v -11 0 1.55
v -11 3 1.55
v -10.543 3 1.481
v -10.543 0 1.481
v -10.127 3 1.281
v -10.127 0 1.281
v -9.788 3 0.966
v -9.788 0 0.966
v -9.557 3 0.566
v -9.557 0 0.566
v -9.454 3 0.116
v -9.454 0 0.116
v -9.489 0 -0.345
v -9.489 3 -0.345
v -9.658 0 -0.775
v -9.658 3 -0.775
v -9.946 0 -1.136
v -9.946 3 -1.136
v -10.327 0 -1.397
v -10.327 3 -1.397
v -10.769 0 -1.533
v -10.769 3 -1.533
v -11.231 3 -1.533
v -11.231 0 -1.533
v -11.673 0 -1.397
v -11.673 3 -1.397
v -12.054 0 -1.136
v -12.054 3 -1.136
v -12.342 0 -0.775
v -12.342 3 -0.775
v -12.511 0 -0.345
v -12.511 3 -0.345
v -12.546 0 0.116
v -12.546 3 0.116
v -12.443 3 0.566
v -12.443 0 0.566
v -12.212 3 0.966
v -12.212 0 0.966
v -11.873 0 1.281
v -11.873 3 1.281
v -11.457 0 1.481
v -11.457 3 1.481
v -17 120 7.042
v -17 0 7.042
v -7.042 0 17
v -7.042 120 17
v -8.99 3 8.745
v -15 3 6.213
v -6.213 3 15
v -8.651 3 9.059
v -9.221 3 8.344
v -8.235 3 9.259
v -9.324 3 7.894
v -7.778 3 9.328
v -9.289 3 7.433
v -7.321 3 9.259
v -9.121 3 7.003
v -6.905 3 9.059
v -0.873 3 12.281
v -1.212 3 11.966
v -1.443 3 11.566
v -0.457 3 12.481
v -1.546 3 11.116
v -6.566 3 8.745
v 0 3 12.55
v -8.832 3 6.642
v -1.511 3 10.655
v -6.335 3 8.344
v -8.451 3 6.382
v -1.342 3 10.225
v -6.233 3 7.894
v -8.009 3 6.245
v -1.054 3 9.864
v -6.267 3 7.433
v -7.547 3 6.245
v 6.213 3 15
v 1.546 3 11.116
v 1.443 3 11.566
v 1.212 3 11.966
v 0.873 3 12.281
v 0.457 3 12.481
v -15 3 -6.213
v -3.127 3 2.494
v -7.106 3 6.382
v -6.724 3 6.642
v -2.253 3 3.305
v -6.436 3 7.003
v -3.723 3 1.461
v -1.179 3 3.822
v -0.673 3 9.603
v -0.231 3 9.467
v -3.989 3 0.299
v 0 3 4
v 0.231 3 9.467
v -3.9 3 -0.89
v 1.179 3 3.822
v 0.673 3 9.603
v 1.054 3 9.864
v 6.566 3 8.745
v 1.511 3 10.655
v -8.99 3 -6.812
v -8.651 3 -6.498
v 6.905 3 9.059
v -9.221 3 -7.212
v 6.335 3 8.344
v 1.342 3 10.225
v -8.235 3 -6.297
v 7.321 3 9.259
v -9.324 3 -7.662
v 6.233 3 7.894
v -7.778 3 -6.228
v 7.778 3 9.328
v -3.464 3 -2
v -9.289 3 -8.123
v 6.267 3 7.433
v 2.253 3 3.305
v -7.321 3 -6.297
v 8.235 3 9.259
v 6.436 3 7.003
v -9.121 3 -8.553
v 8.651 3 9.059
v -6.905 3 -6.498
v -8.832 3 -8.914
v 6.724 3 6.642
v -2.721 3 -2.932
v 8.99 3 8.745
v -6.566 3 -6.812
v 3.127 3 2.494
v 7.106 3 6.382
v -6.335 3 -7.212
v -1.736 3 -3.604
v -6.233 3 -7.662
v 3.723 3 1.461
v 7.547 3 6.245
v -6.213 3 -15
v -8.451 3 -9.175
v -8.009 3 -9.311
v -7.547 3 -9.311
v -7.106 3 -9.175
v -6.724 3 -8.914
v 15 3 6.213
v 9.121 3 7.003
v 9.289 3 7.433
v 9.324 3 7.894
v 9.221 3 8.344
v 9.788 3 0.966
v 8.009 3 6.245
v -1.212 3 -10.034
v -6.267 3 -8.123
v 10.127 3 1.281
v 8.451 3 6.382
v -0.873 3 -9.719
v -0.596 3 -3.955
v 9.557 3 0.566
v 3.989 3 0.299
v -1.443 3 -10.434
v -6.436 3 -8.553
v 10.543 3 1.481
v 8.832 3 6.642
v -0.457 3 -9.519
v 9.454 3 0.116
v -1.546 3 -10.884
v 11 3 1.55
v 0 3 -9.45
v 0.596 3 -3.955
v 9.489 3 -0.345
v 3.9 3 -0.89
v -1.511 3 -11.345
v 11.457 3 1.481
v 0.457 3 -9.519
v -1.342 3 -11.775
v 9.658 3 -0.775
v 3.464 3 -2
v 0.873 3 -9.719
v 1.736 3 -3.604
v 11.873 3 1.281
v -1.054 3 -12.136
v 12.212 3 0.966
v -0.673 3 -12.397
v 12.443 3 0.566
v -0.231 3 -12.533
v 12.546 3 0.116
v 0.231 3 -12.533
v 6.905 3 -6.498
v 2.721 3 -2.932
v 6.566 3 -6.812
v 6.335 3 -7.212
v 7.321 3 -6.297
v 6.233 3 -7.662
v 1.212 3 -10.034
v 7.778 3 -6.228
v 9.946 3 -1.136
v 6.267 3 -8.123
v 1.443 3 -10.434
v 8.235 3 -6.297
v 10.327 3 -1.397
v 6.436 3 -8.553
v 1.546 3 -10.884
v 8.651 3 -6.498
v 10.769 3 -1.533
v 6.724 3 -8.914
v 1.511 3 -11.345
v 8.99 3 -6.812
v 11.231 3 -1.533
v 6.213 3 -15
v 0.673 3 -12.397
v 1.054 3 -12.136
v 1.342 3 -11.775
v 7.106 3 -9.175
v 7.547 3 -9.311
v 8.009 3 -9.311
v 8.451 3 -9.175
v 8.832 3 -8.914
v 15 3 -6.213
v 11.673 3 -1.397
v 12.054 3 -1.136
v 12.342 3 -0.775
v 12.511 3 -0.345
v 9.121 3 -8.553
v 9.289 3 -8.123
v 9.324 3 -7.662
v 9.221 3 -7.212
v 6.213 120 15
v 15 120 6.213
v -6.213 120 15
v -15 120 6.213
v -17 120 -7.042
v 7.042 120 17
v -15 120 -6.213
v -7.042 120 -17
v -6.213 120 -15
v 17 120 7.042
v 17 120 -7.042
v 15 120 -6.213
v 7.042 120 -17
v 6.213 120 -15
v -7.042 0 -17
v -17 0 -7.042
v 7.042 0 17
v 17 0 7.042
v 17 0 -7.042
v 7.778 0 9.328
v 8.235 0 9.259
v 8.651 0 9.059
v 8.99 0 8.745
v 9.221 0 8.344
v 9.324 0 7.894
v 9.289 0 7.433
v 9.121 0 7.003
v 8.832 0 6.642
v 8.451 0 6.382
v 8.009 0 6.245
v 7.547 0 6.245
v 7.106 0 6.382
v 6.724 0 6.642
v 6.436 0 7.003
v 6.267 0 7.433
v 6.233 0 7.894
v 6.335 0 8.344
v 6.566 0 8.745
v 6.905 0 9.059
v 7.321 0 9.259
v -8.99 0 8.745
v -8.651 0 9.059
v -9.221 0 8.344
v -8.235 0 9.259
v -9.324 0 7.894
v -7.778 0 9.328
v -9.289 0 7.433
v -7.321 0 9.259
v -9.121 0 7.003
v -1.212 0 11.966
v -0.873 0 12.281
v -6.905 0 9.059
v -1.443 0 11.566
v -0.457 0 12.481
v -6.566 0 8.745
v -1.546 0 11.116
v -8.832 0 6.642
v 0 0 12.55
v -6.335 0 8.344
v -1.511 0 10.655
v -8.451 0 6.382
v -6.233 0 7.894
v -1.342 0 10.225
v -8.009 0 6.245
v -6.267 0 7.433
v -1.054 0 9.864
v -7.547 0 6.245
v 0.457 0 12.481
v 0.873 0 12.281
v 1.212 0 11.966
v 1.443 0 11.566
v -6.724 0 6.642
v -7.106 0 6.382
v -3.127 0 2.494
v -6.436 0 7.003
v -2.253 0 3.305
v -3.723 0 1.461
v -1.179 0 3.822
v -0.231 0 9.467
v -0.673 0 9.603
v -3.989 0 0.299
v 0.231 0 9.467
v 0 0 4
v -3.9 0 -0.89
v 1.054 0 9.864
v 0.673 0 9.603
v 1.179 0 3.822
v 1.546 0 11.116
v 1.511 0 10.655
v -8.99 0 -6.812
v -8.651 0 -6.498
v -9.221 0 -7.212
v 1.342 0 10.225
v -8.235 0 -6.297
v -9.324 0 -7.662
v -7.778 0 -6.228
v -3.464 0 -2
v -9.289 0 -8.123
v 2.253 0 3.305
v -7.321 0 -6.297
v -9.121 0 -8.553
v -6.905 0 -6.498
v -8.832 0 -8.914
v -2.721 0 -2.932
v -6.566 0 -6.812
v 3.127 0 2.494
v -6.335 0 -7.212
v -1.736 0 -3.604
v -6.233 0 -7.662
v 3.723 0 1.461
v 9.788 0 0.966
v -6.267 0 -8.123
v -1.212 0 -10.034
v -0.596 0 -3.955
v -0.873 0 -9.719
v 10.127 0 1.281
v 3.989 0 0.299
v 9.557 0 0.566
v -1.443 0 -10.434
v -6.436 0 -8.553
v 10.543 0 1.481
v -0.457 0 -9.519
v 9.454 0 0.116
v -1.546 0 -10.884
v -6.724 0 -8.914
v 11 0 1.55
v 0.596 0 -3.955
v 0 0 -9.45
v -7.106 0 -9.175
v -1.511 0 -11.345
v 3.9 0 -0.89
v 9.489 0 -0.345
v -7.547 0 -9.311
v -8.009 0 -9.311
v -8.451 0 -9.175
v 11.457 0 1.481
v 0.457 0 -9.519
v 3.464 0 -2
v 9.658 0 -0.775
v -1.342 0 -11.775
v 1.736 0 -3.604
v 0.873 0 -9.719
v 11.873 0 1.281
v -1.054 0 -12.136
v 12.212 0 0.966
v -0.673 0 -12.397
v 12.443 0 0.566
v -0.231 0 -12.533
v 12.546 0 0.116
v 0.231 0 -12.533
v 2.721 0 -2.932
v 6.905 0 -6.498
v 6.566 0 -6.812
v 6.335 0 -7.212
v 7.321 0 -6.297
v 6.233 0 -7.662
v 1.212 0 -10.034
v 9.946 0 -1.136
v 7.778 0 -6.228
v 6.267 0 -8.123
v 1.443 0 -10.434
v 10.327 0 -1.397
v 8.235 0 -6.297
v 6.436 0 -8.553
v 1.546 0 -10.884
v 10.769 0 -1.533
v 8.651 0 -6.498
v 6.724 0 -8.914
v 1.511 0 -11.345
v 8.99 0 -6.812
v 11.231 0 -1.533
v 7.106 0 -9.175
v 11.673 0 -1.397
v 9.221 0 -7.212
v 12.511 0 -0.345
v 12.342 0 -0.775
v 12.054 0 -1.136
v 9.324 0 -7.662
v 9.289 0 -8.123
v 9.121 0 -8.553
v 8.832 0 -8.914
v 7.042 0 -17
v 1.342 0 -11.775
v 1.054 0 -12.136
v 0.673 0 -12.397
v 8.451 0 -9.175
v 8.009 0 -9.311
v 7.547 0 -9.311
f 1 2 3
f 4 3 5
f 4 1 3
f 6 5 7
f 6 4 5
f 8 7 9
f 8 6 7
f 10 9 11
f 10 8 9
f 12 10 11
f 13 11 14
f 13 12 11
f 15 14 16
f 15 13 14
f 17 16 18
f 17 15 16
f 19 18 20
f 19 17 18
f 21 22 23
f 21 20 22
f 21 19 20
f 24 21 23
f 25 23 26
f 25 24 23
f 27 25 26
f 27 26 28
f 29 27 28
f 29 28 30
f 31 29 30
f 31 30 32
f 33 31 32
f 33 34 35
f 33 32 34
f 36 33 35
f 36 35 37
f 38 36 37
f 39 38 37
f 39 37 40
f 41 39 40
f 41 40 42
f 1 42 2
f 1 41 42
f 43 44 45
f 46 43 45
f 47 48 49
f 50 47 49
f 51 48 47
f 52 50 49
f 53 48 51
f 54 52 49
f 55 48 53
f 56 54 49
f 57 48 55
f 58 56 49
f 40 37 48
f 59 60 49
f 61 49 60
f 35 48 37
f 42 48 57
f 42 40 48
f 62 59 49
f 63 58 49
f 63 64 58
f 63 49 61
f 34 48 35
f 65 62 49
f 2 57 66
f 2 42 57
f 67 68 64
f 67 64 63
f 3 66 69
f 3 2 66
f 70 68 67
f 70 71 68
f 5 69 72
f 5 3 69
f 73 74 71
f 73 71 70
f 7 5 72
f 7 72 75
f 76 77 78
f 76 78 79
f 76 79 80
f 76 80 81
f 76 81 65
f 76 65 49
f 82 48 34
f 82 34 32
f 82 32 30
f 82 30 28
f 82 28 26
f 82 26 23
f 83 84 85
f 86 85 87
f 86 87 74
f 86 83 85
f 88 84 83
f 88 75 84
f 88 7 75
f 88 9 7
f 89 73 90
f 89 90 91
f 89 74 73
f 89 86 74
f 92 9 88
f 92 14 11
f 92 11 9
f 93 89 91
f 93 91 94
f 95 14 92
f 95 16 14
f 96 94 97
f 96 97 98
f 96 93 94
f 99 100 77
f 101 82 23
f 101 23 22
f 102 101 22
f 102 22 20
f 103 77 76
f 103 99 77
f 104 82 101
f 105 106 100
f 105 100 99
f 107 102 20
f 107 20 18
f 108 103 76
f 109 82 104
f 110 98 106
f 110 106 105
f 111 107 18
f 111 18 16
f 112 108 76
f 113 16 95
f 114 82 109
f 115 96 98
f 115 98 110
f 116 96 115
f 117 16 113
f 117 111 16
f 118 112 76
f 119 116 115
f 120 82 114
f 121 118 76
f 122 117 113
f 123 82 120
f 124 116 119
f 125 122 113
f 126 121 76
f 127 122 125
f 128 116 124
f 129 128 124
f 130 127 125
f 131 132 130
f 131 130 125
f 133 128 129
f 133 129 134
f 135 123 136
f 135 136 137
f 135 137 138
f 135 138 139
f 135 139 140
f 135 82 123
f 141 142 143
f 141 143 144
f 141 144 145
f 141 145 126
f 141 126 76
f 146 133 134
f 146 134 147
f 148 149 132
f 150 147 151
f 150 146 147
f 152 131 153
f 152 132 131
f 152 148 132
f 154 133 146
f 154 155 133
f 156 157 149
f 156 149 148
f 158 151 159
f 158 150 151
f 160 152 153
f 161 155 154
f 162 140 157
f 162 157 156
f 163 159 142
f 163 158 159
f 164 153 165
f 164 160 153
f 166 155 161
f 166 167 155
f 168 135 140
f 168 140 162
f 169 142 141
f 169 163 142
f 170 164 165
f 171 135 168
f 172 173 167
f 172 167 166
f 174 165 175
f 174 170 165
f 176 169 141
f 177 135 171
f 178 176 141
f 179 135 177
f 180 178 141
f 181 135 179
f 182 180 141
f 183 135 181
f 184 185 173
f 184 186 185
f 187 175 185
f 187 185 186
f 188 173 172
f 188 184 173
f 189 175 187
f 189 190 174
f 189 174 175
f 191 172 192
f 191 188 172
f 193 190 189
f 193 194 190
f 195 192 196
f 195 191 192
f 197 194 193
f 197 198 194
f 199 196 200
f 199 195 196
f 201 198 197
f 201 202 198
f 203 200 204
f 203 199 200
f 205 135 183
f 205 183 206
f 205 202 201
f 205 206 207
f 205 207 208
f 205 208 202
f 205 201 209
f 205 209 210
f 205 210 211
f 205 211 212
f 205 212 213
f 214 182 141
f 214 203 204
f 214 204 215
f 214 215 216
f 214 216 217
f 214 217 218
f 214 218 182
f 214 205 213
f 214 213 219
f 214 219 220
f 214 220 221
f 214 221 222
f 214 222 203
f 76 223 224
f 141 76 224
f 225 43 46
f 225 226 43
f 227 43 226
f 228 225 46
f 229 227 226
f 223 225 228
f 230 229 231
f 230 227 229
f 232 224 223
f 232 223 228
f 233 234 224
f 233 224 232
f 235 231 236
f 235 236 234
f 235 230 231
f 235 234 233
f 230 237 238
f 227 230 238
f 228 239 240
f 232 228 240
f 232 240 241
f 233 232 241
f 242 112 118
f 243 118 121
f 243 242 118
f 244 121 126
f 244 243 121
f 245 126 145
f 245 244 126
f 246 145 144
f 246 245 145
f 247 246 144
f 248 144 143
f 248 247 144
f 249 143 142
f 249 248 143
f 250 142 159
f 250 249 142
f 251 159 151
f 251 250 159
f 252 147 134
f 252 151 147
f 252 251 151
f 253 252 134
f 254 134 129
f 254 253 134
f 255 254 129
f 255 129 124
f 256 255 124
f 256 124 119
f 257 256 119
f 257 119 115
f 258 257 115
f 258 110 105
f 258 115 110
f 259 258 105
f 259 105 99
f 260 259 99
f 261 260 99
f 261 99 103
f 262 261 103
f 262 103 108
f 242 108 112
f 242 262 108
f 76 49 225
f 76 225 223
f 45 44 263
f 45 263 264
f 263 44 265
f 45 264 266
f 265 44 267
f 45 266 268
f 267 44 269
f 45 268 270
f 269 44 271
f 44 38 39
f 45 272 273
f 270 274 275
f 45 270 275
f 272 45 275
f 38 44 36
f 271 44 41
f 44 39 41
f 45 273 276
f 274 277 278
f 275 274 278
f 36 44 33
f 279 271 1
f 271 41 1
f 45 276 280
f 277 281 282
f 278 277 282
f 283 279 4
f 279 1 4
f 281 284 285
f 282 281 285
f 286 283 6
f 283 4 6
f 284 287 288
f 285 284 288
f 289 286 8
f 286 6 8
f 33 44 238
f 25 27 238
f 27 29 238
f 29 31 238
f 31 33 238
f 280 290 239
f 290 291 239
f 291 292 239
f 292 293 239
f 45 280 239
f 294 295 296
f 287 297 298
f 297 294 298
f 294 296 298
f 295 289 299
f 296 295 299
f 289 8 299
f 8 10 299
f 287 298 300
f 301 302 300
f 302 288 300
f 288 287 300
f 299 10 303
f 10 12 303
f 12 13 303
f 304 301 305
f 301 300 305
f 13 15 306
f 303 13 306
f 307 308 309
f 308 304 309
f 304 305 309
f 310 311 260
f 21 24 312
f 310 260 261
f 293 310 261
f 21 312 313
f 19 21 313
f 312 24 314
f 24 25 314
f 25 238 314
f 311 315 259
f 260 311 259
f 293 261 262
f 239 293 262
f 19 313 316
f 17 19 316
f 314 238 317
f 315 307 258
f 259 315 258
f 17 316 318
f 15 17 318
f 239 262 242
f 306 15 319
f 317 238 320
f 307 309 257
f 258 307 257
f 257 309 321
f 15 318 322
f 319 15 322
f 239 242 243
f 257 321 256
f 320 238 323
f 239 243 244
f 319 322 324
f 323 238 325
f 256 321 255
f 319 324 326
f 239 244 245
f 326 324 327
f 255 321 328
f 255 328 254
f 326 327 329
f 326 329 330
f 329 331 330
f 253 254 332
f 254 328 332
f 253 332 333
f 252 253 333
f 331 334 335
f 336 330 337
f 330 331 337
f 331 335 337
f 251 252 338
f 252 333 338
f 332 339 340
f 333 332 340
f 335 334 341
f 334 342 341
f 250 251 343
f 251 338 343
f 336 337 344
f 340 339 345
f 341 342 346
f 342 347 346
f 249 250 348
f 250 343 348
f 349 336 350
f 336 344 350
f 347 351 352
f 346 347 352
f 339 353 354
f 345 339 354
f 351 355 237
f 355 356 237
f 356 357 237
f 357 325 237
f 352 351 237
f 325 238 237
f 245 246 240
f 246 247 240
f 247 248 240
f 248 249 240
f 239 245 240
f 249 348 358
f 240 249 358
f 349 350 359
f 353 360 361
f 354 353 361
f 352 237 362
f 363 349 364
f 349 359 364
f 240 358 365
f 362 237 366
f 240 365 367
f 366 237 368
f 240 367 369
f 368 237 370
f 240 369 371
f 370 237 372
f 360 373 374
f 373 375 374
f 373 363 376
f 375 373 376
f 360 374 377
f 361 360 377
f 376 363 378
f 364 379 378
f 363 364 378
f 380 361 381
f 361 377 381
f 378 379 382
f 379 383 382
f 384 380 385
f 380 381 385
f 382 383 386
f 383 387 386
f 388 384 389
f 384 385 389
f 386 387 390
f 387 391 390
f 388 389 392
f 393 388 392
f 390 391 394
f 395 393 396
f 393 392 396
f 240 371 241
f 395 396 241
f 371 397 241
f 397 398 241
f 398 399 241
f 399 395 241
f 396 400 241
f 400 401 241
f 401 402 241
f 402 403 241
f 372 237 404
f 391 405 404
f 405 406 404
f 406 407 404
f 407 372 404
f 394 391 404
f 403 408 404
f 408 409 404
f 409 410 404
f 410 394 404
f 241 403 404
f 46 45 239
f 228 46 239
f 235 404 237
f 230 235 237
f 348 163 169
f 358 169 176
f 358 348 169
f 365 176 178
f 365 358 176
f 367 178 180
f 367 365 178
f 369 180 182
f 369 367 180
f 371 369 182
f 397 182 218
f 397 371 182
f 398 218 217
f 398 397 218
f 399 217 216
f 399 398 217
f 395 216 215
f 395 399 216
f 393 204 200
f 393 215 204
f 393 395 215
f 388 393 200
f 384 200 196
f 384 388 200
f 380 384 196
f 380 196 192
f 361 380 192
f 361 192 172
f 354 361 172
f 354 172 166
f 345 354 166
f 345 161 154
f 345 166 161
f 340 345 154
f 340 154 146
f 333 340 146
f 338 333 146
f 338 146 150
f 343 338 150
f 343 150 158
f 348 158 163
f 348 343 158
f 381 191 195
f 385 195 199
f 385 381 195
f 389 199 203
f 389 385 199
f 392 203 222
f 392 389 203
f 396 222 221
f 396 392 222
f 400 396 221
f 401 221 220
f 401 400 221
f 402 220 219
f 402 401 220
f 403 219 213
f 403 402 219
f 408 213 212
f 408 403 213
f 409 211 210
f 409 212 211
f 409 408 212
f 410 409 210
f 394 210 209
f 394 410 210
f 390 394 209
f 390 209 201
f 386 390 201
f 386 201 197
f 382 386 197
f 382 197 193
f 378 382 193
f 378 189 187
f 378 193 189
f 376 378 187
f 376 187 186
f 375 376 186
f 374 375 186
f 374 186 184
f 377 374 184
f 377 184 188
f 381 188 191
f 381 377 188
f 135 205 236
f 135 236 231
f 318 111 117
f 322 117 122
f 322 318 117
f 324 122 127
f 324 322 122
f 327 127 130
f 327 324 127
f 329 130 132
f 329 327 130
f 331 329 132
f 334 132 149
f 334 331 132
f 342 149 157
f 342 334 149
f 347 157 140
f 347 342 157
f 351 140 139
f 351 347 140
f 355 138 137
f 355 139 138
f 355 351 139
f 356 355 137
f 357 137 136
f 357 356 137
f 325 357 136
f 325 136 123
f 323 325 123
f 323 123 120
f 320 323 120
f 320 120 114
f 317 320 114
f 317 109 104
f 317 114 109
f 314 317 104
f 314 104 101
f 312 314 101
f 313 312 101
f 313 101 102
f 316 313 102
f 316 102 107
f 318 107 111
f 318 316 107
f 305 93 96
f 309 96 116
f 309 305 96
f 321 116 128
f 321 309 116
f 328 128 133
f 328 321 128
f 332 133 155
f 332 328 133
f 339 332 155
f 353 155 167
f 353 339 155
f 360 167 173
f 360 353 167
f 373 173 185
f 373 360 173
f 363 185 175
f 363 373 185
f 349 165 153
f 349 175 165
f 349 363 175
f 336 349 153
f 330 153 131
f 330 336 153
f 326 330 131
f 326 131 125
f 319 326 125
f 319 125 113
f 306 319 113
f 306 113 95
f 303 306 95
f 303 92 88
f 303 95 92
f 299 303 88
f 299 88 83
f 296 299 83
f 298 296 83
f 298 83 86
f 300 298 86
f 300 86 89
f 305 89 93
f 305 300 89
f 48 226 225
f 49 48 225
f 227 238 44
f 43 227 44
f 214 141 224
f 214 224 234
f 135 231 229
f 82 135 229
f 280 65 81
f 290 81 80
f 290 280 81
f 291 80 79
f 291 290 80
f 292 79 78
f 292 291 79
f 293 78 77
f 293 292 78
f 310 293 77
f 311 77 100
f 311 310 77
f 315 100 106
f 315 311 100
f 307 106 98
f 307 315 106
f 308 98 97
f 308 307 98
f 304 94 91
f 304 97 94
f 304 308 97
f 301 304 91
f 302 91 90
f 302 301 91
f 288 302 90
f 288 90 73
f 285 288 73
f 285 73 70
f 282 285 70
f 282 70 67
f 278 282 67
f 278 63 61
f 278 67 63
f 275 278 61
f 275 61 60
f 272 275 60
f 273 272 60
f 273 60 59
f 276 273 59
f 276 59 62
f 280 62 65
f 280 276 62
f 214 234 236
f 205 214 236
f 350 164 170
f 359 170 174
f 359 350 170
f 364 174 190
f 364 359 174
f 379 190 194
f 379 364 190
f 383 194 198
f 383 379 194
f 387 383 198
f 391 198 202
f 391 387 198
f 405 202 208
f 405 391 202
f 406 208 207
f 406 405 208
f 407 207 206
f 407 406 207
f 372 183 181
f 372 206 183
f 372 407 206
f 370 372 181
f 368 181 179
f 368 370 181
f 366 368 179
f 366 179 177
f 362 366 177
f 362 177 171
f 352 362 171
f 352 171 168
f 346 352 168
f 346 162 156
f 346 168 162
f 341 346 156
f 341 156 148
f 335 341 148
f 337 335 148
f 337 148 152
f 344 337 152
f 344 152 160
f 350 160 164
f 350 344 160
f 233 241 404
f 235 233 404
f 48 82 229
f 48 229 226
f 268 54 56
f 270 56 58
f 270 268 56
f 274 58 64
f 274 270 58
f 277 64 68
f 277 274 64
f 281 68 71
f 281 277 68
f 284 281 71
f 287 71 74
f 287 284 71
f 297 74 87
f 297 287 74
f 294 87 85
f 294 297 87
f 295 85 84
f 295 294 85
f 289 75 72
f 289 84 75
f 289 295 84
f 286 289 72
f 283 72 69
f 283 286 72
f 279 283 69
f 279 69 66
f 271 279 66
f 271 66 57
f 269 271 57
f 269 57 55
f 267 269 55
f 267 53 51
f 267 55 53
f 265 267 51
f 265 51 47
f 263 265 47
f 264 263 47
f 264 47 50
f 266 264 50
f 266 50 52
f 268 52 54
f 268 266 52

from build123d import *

# Parameters (mm, degrees)
CROQUIS1_R              = 1.55
CROQUIS1_R_2            = 4
SALIENTE_EXTRUIR1_DEPTH = 120
CORTAR_EXTRUIR1_DEPTH   = 117


with BuildPart() as part:
    # Croquis1 → Saliente-Extruir1 (new body)
    with BuildSketch(Plane(origin=(0, 0, 0), x_dir=(1, 0, 0), z_dir=(0, 1, 0))):
        Polygon((17, -7.04163056), (17, 7.04163056), (7.04163056, 17), (-7.04163056, 17), (-17, 7.04163056), (-17, -7.04163056), (-7.04163056, -17), (7.04163056, -17), align=None)
        with Locations(Location((0, 11, 0), (0, 0, 270))):
            Circle(CROQUIS1_R, mode=Mode.SUBTRACT)
        with Locations(Location((0, 0, 0), (0, 0, 270))):
            Circle(CROQUIS1_R_2, mode=Mode.SUBTRACT)
        with Locations(Location((7.778174593, 7.778174593, 0), (0, 0, 270))):
            Circle(CROQUIS1_R, mode=Mode.SUBTRACT)
        with Locations(Location((11, 0, 0), (0, 0, 270))):
            Circle(CROQUIS1_R, mode=Mode.SUBTRACT)
        with Locations(Location((7.778174593, -7.778174593, 0), (0, 0, 270))):
            Circle(CROQUIS1_R, mode=Mode.SUBTRACT)
        with Locations(Location((0, -11, 0), (0, 0, 270))):
            Circle(CROQUIS1_R, mode=Mode.SUBTRACT)
        with Locations(Location((-7.778174593, -7.778174593, 0), (0, 0, 270))):
            Circle(CROQUIS1_R, mode=Mode.SUBTRACT)
        with Locations(Location((-11, 0, 0), (0, 0, 270))):
            Circle(CROQUIS1_R, mode=Mode.SUBTRACT)
        with Locations(Location((-7.778174593, 7.778174593, 0), (0, 0, 270))):
            Circle(CROQUIS1_R, mode=Mode.SUBTRACT)
    extrude(amount=SALIENTE_EXTRUIR1_DEPTH)

    # Croquis2 → Cortar-Extruir1 (cut)
    with BuildSketch(Plane(origin=(0, 120, 0), x_dir=(1, 0, 0), z_dir=(0, 1, 0))):
        Polygon((6.213203436, 15), (-6.213203436, 15), (-15, 6.213203436), (-15, -6.213203436), (-6.213203436, -15), (6.213203436, -15), (15, -6.213203436), (15, 6.213203436), align=None)
    extrude(amount=-CORTAR_EXTRUIR1_DEPTH, mode=Mode.SUBTRACT)


solid = part.part
